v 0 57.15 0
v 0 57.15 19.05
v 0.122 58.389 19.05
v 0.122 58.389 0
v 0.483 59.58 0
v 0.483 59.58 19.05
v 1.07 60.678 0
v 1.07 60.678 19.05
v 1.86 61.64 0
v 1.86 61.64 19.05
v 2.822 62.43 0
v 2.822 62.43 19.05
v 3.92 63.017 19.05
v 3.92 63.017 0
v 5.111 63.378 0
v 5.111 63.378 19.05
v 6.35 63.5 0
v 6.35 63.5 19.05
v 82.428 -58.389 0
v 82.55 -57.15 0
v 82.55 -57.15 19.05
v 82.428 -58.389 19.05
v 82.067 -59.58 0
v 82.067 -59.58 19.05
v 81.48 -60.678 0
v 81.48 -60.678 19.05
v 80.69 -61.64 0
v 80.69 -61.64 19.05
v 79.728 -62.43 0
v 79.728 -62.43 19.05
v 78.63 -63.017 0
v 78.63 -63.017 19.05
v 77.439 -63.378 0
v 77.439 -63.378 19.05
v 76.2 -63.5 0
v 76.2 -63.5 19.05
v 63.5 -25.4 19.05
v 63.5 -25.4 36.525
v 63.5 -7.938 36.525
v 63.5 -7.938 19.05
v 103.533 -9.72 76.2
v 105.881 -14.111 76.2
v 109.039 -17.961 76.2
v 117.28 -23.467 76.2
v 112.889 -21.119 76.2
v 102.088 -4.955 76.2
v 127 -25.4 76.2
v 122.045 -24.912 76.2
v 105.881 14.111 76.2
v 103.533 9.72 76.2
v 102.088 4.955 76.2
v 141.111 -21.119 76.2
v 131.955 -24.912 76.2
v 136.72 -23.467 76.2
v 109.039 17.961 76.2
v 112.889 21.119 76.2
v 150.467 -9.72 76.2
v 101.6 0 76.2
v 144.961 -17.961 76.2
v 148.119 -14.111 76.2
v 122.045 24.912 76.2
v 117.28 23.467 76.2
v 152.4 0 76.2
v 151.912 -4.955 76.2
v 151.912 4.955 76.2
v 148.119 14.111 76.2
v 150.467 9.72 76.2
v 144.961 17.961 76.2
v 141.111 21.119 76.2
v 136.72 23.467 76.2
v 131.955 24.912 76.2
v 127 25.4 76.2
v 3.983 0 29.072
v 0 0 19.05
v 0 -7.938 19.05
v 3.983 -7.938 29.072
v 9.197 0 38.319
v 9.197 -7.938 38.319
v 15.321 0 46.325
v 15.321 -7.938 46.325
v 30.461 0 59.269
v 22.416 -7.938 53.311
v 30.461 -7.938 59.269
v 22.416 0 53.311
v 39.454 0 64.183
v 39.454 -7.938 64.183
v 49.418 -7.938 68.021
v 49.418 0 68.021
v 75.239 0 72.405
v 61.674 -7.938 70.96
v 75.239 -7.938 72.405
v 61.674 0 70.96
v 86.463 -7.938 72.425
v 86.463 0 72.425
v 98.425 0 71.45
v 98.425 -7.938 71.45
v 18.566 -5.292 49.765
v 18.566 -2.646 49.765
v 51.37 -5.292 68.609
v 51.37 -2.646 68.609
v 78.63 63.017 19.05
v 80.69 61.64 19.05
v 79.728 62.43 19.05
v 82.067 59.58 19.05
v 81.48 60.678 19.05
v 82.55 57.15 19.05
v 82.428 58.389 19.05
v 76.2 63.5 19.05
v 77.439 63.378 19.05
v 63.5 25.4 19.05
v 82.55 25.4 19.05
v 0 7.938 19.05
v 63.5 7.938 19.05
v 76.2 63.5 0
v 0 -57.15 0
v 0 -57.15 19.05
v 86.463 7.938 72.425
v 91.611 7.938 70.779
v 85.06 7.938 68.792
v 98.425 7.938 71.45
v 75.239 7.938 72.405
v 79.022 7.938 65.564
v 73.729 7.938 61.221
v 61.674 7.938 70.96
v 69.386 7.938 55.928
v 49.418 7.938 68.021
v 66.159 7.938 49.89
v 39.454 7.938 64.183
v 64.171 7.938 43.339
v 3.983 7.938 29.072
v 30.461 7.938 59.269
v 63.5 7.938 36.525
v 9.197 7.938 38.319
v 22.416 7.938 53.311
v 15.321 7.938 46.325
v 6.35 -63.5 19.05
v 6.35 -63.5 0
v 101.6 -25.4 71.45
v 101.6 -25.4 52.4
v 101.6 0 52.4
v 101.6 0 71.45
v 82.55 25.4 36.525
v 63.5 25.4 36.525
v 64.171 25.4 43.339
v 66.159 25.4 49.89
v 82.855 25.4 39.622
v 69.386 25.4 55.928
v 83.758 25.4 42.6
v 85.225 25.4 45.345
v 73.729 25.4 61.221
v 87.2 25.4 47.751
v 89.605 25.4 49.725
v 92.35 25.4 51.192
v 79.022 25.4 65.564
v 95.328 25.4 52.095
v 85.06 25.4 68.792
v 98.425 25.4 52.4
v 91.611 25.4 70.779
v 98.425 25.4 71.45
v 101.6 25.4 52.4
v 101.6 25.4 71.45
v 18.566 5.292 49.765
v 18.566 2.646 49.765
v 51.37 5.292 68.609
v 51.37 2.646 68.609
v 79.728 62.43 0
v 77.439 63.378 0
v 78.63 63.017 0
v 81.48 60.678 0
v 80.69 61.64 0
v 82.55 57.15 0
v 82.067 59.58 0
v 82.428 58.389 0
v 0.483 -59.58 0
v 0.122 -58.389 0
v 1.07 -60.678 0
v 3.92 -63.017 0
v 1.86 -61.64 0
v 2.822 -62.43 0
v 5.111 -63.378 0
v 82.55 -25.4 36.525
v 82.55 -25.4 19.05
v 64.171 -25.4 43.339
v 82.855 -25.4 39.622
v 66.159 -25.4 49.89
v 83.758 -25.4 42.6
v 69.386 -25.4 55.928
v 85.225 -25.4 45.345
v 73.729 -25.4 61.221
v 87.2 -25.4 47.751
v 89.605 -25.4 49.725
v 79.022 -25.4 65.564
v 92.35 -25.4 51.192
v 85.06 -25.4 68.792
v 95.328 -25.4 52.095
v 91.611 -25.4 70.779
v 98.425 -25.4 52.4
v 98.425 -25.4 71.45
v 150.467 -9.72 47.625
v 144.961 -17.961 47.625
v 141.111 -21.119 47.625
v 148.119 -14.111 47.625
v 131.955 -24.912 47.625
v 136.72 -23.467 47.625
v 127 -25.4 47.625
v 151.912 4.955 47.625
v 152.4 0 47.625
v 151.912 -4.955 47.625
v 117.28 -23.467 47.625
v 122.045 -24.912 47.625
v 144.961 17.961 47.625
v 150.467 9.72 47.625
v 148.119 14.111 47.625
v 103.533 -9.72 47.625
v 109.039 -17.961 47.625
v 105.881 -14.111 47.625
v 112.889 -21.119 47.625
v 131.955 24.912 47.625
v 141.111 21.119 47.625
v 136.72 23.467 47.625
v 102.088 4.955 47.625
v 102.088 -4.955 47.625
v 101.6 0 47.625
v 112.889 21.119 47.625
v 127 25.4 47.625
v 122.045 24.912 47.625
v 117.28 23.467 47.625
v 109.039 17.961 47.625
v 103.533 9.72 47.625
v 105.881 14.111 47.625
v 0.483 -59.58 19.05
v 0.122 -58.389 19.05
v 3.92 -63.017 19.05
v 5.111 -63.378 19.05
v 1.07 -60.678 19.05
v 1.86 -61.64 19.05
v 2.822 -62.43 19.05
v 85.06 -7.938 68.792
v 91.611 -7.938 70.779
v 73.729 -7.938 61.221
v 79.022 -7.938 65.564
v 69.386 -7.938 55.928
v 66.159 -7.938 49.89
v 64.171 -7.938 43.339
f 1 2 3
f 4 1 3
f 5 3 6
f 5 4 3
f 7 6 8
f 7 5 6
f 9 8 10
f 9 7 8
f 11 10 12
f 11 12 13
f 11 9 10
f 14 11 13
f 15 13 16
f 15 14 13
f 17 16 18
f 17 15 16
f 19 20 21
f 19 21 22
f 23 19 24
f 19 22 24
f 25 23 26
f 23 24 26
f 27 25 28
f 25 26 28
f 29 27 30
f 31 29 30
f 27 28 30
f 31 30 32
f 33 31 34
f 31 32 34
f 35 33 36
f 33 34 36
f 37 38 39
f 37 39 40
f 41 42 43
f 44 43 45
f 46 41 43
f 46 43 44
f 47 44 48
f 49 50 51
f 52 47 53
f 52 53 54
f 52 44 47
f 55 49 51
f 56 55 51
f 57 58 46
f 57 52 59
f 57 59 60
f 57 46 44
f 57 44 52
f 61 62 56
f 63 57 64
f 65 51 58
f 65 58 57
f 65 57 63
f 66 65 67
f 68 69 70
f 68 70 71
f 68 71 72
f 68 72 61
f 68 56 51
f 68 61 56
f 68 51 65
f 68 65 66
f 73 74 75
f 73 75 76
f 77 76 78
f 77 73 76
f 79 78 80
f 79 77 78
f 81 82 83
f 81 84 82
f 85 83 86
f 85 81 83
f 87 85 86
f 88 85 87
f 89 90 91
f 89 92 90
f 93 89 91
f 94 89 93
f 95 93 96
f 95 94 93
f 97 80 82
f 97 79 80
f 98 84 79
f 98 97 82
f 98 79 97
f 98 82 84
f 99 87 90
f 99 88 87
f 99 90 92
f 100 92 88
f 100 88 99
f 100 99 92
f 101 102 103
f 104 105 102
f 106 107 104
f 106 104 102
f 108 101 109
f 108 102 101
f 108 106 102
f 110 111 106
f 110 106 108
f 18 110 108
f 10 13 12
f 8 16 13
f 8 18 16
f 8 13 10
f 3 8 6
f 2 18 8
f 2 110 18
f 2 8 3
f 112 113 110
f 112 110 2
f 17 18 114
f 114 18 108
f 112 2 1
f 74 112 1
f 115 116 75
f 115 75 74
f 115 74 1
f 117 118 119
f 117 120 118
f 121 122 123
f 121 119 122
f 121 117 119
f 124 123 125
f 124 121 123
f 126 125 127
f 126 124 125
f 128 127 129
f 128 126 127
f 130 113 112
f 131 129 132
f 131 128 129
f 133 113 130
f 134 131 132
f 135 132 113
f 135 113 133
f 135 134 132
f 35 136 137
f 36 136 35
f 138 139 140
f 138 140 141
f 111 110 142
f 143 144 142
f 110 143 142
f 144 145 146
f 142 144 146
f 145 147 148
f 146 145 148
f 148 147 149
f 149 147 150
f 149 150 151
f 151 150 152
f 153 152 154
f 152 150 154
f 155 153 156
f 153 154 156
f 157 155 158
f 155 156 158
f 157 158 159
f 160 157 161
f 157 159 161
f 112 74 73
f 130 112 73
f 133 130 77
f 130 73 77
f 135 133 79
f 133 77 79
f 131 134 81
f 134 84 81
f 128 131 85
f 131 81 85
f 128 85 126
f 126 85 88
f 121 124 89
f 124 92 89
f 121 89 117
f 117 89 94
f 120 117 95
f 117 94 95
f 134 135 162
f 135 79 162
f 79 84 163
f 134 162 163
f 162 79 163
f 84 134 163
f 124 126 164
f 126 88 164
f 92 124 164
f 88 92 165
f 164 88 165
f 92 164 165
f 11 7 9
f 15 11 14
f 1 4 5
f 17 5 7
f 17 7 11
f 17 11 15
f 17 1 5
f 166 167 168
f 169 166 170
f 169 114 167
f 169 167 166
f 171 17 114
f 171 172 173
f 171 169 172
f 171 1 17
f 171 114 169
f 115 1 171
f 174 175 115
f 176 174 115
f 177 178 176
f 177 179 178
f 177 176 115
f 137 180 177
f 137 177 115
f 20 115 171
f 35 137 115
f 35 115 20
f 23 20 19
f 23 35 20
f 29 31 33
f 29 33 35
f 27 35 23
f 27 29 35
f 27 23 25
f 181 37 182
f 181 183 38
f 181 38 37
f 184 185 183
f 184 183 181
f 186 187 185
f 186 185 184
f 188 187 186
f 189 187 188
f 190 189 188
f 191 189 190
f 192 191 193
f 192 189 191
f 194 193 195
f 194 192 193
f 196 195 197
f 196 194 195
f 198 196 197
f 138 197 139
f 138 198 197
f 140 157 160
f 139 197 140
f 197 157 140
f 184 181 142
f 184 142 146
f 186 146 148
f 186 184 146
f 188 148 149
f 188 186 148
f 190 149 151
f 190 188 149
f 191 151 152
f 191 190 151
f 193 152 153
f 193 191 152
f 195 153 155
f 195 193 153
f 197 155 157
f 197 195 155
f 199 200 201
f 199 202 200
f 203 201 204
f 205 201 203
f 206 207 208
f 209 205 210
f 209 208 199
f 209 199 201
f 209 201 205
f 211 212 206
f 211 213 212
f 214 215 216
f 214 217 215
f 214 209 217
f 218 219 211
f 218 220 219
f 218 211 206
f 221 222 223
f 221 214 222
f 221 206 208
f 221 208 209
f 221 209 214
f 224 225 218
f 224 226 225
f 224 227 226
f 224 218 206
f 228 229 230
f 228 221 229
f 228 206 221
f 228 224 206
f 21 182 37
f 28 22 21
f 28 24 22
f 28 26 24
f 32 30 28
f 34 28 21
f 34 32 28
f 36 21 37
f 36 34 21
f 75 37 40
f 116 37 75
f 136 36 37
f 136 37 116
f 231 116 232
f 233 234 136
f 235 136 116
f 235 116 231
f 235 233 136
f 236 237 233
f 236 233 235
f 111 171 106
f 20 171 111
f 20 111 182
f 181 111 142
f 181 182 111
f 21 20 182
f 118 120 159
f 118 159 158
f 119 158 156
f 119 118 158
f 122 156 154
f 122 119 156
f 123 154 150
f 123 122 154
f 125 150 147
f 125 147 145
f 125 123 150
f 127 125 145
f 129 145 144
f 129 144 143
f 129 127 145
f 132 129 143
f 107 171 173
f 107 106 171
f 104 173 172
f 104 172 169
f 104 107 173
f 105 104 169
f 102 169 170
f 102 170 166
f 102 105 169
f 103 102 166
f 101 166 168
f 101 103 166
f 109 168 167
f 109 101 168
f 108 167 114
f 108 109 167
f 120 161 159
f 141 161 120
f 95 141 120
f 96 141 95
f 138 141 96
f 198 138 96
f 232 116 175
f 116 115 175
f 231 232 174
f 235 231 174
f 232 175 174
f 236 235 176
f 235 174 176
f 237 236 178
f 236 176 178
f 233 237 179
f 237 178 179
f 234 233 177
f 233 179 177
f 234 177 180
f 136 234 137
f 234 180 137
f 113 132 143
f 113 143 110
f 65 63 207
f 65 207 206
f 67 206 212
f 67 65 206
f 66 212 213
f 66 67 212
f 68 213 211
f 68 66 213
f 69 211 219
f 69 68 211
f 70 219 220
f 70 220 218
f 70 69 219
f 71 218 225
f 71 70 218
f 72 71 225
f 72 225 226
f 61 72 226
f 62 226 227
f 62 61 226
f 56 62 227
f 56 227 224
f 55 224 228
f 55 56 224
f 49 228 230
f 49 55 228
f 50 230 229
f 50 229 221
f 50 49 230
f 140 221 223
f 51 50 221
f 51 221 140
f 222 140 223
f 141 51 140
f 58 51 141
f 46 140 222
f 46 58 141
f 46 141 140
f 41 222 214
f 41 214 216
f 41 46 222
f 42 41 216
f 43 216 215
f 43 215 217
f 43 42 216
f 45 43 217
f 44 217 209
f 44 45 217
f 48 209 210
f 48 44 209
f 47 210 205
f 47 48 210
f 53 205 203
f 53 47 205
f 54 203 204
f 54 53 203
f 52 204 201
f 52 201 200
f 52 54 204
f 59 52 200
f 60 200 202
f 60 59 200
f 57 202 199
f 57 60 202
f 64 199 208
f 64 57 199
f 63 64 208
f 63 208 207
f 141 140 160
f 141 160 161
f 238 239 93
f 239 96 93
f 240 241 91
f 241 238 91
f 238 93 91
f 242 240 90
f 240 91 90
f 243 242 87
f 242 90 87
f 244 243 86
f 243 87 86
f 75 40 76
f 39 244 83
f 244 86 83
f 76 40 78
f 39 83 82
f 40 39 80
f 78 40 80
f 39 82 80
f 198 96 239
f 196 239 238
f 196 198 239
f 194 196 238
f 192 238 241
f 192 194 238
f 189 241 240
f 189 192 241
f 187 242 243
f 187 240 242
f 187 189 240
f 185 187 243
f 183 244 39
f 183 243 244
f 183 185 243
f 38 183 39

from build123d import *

# Parameters (mm, degrees)
F1_DEPTH = 63.5
F2_DEPTH = 25.4
F3_DEPTH = 7.9375
F5_R     = 6.35


with BuildPart() as f1:
    # F0 (on Front) → F1 (new body, symmetric)
    with BuildSketch(Plane.XZ):
        Polygon((0, 19.05), (0, 0), (82.55, 0), (82.55, 19.05), (63.5, 19.05), align=None)
    extrude(amount=F1_DEPTH, both=True)

    # F0 (on Front) → F2 (join, symmetric)
    with BuildSketch(Plane.XZ):
        with BuildLine():
            Line((63.5, 19.05), (82.55, 19.05))
            Line((82.55, 19.05), (82.55, 36.5252))
            ThreePointArc((82.55, 36.5252), (87.19968, 47.75052), (98.425, 52.4002))
            Line((98.425, 52.4002), (101.6, 52.4002))
            Line((101.6, 52.4002), (101.6, 71.4502))
            Line((101.6, 71.4502), (98.425, 71.4502))
            ThreePointArc((98.425, 71.4502), (73.729296, 61.220904), (63.5, 36.5252))
            Line((63.5, 36.5252), (63.5, 19.05))
        make_face()
    extrude(amount=F2_DEPTH, both=True)

    # F0 (on Front) → F3 (join, symmetric)
    with BuildSketch(Plane.XZ):
        with BuildLine():
            add(Edge.make_bspline(
                [(0, 19.05), (11.451263, 54.324433), (44.240966, 77.987105), (98.425, 71.4502)],
                knots=[0, 0, 0, 0, 111.504536, 111.504536, 111.504536, 111.504536], degree=3))
            Line((0, 19.05), (63.5, 19.05))
            Line((63.5, 19.05), (63.5, 36.5252))
            ThreePointArc((63.5, 36.5252), (73.729296, 61.220904), (98.425, 71.4502))
        make_face()
    extrude(amount=F3_DEPTH, both=True)

    # F0 (on Front) → F4 (revolve)
    with BuildSketch(Plane.XZ):
        Polygon((127, 76.2), (127, 71.4502), (127, 47.625), (152.4, 47.625), (152.4, 76.2), align=None)
    revolve(axis=Axis((127, 0, 61.9125), (0, 0, 1)))

    # F5
    f5_edges = [f1.edges().sort_by_distance(p)[0] for p in [
        (82.55, -63.5, 9.525),
        (0, 63.5, 9.525),
        (82.55, 63.5, 9.525),
        (0, -63.5, 9.525),
    ]]
    fillet(f5_edges, radius=F5_R)


solid = f1.part
